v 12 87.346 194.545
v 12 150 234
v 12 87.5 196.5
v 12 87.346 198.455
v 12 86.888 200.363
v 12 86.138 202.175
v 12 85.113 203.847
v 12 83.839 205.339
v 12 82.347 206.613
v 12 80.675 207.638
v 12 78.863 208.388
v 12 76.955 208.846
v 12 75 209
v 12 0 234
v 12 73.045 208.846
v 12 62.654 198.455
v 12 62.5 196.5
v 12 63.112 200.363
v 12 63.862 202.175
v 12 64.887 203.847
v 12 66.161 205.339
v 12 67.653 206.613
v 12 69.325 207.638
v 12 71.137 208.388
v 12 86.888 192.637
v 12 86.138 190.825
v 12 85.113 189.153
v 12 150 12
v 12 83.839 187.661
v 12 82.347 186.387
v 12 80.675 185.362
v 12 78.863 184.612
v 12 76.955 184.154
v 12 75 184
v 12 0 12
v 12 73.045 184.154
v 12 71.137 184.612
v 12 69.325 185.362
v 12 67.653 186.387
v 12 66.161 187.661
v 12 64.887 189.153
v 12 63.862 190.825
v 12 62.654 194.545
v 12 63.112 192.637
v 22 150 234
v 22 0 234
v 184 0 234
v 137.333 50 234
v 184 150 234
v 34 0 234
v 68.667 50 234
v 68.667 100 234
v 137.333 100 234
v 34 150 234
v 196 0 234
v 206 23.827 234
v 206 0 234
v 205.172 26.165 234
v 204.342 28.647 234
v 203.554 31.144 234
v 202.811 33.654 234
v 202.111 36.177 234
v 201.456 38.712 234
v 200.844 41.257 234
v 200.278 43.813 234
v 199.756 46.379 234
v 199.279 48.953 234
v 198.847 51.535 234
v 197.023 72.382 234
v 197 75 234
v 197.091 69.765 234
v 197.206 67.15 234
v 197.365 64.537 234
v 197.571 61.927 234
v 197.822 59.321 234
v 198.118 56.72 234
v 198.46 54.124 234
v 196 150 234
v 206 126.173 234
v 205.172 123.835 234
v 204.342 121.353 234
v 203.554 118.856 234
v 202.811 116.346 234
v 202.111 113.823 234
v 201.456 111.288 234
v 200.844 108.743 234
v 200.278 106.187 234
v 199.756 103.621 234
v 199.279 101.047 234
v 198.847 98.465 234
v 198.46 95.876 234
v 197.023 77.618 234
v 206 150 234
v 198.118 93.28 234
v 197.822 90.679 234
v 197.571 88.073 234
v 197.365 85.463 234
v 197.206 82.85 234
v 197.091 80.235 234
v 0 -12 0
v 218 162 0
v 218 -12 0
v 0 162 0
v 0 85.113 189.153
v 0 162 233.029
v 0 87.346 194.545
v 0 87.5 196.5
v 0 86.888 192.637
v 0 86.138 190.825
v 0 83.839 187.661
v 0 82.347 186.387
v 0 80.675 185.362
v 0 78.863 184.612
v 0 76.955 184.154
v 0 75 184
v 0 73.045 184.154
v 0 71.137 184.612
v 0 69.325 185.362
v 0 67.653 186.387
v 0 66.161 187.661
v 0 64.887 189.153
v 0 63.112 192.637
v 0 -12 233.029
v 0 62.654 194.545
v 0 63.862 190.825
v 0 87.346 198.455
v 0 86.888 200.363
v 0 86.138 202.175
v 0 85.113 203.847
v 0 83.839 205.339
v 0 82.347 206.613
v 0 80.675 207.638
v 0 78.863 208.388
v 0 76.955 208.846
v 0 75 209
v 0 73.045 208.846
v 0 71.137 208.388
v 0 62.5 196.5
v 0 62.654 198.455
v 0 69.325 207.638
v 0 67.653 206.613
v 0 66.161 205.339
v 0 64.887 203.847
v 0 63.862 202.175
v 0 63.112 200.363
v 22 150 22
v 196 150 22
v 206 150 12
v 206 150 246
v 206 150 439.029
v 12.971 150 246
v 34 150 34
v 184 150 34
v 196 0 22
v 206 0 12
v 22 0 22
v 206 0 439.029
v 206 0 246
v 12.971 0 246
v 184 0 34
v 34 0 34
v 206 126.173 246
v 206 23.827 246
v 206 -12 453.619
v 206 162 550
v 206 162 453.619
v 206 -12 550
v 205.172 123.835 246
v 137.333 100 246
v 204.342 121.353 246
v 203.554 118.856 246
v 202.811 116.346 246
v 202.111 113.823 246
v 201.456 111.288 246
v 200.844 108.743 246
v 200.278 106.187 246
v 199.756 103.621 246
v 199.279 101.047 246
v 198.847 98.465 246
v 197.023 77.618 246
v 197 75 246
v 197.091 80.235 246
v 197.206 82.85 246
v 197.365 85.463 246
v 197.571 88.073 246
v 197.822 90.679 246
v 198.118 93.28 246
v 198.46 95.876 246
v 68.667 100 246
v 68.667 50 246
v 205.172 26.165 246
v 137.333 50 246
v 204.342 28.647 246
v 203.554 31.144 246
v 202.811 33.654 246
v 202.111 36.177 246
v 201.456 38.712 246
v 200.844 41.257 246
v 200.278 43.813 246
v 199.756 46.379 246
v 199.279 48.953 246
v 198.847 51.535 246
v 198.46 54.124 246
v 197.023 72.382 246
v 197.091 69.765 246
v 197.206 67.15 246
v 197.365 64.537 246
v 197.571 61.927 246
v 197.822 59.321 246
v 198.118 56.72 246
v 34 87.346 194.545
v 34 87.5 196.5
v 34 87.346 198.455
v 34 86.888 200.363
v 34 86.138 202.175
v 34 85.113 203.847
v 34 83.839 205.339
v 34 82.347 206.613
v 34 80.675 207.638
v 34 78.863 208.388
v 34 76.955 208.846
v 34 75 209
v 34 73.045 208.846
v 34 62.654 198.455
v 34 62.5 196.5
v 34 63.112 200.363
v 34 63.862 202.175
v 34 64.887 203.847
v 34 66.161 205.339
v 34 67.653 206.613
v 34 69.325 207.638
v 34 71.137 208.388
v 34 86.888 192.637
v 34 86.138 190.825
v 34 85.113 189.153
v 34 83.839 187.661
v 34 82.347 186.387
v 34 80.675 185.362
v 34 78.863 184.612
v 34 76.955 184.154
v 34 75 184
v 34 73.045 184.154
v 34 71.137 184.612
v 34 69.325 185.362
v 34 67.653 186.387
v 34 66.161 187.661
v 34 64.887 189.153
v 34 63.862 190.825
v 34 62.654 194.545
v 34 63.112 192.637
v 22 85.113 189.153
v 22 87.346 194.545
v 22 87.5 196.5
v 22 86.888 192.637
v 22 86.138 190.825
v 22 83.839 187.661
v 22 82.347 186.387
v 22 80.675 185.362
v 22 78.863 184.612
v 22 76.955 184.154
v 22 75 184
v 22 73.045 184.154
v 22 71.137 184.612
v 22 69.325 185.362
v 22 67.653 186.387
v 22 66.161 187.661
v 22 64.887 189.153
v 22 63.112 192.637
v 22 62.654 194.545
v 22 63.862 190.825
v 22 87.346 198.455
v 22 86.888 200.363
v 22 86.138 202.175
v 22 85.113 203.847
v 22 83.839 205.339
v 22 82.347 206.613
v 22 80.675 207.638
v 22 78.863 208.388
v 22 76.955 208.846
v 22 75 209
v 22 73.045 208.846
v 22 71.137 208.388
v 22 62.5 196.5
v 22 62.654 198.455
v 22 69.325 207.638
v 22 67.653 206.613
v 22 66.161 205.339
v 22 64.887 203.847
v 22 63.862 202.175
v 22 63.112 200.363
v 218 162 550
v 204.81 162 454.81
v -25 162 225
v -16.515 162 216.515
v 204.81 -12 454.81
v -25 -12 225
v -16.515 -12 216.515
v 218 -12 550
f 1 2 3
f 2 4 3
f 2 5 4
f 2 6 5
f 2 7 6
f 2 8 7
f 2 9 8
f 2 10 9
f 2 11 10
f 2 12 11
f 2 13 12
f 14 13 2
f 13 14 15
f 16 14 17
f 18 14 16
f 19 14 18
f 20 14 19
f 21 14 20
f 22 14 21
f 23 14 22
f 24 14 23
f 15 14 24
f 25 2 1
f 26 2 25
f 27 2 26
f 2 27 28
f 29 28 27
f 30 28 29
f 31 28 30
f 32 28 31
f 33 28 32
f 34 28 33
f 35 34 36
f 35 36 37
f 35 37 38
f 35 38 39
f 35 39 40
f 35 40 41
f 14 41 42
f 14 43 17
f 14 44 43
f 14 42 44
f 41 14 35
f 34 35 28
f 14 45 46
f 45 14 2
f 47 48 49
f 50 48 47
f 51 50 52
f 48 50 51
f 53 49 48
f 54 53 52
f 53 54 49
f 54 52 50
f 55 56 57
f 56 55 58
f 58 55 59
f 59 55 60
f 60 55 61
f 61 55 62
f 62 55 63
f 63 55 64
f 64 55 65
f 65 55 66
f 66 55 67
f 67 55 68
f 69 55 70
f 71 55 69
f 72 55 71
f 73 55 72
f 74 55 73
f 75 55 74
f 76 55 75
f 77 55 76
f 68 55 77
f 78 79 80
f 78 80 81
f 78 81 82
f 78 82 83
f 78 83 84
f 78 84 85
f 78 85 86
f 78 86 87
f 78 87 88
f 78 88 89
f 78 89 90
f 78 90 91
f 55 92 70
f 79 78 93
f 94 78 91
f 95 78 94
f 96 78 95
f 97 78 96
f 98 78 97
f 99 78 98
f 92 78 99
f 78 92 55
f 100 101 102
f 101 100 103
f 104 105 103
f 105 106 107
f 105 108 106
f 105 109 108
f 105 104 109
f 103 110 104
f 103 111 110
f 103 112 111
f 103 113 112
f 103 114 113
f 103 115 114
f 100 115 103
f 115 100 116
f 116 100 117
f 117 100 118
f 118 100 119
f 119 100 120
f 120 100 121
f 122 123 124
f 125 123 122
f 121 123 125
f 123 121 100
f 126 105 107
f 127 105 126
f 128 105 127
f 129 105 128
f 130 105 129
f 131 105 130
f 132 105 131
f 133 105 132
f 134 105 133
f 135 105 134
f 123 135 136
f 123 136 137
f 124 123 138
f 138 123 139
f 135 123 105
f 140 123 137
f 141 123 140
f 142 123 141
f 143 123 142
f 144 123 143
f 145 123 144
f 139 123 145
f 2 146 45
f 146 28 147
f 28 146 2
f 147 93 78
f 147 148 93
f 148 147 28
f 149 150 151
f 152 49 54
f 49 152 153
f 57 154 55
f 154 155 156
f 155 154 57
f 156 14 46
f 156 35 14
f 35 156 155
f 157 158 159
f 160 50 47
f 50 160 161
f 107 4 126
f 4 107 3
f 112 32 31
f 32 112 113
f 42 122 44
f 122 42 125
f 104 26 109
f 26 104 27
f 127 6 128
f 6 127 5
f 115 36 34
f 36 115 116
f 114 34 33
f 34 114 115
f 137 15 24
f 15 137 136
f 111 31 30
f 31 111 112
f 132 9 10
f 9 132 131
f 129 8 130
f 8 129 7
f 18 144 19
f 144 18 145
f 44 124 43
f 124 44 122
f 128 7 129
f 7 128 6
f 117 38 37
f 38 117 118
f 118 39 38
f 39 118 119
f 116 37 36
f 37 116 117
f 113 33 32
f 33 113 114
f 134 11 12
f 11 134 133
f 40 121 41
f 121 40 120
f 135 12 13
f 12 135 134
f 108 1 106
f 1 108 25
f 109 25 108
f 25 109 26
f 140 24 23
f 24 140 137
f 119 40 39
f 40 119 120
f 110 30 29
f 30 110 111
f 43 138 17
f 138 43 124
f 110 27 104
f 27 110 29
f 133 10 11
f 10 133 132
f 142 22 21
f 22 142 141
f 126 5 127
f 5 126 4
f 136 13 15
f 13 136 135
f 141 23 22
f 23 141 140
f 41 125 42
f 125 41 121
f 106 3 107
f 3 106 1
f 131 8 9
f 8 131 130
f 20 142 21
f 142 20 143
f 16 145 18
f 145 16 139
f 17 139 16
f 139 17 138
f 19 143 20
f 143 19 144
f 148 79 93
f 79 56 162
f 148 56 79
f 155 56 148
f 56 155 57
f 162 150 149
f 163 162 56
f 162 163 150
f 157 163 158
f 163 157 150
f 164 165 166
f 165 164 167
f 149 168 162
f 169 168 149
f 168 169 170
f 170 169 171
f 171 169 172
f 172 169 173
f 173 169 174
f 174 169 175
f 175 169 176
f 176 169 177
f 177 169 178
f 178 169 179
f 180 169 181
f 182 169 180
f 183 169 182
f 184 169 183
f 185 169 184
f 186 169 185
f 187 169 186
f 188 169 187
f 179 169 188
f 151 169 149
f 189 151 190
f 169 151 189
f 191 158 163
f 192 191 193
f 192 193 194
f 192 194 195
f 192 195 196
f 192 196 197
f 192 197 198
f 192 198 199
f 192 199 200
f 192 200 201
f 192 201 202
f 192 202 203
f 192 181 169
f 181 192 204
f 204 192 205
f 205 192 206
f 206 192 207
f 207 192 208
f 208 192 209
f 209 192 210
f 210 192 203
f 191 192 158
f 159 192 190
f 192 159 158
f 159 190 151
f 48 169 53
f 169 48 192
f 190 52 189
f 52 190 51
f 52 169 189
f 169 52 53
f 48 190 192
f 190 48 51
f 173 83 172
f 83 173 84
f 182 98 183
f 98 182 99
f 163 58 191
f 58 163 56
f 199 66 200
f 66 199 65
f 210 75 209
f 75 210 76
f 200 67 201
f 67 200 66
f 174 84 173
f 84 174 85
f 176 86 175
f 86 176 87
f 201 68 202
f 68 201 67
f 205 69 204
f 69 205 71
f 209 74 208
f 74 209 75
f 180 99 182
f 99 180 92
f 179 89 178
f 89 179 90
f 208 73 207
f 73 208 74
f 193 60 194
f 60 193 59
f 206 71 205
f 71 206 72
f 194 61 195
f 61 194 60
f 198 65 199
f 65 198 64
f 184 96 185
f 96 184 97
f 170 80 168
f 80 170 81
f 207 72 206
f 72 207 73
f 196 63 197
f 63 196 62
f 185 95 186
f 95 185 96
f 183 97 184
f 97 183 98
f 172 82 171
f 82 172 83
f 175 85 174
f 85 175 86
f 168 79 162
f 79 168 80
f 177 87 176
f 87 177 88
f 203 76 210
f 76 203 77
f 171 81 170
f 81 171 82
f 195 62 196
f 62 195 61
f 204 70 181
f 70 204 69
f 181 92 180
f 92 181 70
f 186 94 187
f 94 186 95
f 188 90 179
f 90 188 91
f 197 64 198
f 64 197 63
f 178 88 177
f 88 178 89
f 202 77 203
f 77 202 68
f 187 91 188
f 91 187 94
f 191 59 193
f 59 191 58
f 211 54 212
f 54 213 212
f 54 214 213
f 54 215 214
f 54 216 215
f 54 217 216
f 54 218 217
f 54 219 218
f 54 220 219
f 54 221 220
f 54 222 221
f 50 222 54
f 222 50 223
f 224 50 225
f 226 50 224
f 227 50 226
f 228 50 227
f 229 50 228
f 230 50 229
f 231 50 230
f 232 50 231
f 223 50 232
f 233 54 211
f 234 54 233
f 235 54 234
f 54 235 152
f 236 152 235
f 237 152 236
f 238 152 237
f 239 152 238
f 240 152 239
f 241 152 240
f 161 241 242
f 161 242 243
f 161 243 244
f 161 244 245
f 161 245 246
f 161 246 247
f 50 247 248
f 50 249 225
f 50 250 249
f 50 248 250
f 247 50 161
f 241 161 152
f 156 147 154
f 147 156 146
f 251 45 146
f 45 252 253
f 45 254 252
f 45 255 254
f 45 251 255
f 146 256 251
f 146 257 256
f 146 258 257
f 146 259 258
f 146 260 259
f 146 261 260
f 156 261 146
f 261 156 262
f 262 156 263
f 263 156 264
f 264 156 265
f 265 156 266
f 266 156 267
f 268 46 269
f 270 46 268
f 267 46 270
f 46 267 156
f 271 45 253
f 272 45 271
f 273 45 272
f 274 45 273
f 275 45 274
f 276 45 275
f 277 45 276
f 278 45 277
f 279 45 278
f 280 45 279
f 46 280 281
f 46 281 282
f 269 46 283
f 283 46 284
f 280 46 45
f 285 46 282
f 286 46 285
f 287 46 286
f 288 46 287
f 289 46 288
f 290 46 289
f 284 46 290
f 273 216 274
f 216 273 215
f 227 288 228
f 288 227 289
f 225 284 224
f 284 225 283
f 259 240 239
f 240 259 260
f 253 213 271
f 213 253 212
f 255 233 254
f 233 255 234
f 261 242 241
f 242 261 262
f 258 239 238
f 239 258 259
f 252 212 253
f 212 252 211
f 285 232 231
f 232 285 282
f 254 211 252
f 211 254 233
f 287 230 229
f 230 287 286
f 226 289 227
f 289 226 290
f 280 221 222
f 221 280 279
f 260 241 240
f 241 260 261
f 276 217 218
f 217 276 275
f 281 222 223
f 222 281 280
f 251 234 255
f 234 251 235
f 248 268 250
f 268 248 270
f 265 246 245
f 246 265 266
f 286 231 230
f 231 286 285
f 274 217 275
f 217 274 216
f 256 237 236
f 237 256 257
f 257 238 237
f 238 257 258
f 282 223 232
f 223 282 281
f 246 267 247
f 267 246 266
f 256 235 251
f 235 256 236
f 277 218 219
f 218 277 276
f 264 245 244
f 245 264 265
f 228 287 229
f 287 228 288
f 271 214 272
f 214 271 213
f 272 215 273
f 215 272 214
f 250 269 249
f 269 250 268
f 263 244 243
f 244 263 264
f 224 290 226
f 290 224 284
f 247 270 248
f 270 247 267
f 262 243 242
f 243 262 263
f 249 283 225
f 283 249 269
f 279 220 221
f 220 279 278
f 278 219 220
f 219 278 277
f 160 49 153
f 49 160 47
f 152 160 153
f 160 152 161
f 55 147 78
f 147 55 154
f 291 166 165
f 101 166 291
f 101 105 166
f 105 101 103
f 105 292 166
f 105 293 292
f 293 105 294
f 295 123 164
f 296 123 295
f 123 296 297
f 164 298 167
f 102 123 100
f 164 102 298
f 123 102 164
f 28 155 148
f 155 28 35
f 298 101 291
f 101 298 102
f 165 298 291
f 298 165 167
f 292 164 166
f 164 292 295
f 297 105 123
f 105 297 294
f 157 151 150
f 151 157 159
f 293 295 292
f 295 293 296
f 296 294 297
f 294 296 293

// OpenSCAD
//bottom plank (red)
color([1, 0, 0]) translate([12, 0, 0]) cube([194, 150, 12]);

//back plank (blue)
color([0, 0, 1]) translate([206, -12, 0]) cube([12, 174, 550]);

difference() {
	//front plank (green)
	color([0, 1, 0]) cube([12, 150, 234]);
	//hole
	translate([-10, 75, 196.5]) rotate(90, [0, 1, 0])
	    cylinder(44, 12.5, 12.5, false, $fa=1);
};

difference() {
    //top plank (red)
    color([1, 0, 0]) translate([0, 0, 234]) cube([206, 150, 12]);
    //window (perspex)
    translate([206/3, 150/3, 233]) cube([206/3, 50, 14]);
    //cable cut-out
    translate([347, 75, 233]) cylinder(44, 150, 150, center=true, $fa=1);
    
};

//top plank (yellow)
color([1,1,0]) translate([-25, -12, 225]) rotate(45, [0,1,0]) cube([12, 174, 325]);

//bird section
translate([0, 0, 0]) // UNEXPLODED
//translate([0, 400, 0]) // EXPLODED
{   
    //bottom plank (yellow)
    translate([34, 0, 22]) cube([150, 150, 12]);
    
    //back plank (green) 
    color("purple") translate([184, 0, 22]) cube([12, 150, 212]);
    
    difference() {
	//front plank (blue)
	color([0, 0, 1]) translate([22, 0, 22]) cube([12, 150, 212]);
	//hole
	translate([-10, 75, 196.5]) rotate(90, [0, 1, 0])
	    cylinder(49, 12.5, 12.5, false, $fa=1);
    };
};

//side planks (turquoise)
color([0, 1, 1])
translate([0, 0, 0]) // UNEXPLODED
//translate([0, -400, 0]) // EXPLODED
{
    //left side (from front)
    translate([0, 150, 0]) {
        //square section
        cube([206, 12, 234]);
        
        //triangle section
        translate([0, 12, 234])
        rotate(90, [1, 0, 0])
        linear_extrude(height = 12)
        polygon([[0, 0], [206, 0], [206, 206]]);
        
    }
    
    //right side (from front)
    translate([0, -12, 0]) {
        //square section
        cube([206, 12, 234]);
        
        //triangle section
        translate([0, 12, 234])
        rotate(90, [1, 0, 0])
        linear_extrude(height = 12)
        polygon([[0, 0], [206, 0], [206, 206]]);
    }
    
};
